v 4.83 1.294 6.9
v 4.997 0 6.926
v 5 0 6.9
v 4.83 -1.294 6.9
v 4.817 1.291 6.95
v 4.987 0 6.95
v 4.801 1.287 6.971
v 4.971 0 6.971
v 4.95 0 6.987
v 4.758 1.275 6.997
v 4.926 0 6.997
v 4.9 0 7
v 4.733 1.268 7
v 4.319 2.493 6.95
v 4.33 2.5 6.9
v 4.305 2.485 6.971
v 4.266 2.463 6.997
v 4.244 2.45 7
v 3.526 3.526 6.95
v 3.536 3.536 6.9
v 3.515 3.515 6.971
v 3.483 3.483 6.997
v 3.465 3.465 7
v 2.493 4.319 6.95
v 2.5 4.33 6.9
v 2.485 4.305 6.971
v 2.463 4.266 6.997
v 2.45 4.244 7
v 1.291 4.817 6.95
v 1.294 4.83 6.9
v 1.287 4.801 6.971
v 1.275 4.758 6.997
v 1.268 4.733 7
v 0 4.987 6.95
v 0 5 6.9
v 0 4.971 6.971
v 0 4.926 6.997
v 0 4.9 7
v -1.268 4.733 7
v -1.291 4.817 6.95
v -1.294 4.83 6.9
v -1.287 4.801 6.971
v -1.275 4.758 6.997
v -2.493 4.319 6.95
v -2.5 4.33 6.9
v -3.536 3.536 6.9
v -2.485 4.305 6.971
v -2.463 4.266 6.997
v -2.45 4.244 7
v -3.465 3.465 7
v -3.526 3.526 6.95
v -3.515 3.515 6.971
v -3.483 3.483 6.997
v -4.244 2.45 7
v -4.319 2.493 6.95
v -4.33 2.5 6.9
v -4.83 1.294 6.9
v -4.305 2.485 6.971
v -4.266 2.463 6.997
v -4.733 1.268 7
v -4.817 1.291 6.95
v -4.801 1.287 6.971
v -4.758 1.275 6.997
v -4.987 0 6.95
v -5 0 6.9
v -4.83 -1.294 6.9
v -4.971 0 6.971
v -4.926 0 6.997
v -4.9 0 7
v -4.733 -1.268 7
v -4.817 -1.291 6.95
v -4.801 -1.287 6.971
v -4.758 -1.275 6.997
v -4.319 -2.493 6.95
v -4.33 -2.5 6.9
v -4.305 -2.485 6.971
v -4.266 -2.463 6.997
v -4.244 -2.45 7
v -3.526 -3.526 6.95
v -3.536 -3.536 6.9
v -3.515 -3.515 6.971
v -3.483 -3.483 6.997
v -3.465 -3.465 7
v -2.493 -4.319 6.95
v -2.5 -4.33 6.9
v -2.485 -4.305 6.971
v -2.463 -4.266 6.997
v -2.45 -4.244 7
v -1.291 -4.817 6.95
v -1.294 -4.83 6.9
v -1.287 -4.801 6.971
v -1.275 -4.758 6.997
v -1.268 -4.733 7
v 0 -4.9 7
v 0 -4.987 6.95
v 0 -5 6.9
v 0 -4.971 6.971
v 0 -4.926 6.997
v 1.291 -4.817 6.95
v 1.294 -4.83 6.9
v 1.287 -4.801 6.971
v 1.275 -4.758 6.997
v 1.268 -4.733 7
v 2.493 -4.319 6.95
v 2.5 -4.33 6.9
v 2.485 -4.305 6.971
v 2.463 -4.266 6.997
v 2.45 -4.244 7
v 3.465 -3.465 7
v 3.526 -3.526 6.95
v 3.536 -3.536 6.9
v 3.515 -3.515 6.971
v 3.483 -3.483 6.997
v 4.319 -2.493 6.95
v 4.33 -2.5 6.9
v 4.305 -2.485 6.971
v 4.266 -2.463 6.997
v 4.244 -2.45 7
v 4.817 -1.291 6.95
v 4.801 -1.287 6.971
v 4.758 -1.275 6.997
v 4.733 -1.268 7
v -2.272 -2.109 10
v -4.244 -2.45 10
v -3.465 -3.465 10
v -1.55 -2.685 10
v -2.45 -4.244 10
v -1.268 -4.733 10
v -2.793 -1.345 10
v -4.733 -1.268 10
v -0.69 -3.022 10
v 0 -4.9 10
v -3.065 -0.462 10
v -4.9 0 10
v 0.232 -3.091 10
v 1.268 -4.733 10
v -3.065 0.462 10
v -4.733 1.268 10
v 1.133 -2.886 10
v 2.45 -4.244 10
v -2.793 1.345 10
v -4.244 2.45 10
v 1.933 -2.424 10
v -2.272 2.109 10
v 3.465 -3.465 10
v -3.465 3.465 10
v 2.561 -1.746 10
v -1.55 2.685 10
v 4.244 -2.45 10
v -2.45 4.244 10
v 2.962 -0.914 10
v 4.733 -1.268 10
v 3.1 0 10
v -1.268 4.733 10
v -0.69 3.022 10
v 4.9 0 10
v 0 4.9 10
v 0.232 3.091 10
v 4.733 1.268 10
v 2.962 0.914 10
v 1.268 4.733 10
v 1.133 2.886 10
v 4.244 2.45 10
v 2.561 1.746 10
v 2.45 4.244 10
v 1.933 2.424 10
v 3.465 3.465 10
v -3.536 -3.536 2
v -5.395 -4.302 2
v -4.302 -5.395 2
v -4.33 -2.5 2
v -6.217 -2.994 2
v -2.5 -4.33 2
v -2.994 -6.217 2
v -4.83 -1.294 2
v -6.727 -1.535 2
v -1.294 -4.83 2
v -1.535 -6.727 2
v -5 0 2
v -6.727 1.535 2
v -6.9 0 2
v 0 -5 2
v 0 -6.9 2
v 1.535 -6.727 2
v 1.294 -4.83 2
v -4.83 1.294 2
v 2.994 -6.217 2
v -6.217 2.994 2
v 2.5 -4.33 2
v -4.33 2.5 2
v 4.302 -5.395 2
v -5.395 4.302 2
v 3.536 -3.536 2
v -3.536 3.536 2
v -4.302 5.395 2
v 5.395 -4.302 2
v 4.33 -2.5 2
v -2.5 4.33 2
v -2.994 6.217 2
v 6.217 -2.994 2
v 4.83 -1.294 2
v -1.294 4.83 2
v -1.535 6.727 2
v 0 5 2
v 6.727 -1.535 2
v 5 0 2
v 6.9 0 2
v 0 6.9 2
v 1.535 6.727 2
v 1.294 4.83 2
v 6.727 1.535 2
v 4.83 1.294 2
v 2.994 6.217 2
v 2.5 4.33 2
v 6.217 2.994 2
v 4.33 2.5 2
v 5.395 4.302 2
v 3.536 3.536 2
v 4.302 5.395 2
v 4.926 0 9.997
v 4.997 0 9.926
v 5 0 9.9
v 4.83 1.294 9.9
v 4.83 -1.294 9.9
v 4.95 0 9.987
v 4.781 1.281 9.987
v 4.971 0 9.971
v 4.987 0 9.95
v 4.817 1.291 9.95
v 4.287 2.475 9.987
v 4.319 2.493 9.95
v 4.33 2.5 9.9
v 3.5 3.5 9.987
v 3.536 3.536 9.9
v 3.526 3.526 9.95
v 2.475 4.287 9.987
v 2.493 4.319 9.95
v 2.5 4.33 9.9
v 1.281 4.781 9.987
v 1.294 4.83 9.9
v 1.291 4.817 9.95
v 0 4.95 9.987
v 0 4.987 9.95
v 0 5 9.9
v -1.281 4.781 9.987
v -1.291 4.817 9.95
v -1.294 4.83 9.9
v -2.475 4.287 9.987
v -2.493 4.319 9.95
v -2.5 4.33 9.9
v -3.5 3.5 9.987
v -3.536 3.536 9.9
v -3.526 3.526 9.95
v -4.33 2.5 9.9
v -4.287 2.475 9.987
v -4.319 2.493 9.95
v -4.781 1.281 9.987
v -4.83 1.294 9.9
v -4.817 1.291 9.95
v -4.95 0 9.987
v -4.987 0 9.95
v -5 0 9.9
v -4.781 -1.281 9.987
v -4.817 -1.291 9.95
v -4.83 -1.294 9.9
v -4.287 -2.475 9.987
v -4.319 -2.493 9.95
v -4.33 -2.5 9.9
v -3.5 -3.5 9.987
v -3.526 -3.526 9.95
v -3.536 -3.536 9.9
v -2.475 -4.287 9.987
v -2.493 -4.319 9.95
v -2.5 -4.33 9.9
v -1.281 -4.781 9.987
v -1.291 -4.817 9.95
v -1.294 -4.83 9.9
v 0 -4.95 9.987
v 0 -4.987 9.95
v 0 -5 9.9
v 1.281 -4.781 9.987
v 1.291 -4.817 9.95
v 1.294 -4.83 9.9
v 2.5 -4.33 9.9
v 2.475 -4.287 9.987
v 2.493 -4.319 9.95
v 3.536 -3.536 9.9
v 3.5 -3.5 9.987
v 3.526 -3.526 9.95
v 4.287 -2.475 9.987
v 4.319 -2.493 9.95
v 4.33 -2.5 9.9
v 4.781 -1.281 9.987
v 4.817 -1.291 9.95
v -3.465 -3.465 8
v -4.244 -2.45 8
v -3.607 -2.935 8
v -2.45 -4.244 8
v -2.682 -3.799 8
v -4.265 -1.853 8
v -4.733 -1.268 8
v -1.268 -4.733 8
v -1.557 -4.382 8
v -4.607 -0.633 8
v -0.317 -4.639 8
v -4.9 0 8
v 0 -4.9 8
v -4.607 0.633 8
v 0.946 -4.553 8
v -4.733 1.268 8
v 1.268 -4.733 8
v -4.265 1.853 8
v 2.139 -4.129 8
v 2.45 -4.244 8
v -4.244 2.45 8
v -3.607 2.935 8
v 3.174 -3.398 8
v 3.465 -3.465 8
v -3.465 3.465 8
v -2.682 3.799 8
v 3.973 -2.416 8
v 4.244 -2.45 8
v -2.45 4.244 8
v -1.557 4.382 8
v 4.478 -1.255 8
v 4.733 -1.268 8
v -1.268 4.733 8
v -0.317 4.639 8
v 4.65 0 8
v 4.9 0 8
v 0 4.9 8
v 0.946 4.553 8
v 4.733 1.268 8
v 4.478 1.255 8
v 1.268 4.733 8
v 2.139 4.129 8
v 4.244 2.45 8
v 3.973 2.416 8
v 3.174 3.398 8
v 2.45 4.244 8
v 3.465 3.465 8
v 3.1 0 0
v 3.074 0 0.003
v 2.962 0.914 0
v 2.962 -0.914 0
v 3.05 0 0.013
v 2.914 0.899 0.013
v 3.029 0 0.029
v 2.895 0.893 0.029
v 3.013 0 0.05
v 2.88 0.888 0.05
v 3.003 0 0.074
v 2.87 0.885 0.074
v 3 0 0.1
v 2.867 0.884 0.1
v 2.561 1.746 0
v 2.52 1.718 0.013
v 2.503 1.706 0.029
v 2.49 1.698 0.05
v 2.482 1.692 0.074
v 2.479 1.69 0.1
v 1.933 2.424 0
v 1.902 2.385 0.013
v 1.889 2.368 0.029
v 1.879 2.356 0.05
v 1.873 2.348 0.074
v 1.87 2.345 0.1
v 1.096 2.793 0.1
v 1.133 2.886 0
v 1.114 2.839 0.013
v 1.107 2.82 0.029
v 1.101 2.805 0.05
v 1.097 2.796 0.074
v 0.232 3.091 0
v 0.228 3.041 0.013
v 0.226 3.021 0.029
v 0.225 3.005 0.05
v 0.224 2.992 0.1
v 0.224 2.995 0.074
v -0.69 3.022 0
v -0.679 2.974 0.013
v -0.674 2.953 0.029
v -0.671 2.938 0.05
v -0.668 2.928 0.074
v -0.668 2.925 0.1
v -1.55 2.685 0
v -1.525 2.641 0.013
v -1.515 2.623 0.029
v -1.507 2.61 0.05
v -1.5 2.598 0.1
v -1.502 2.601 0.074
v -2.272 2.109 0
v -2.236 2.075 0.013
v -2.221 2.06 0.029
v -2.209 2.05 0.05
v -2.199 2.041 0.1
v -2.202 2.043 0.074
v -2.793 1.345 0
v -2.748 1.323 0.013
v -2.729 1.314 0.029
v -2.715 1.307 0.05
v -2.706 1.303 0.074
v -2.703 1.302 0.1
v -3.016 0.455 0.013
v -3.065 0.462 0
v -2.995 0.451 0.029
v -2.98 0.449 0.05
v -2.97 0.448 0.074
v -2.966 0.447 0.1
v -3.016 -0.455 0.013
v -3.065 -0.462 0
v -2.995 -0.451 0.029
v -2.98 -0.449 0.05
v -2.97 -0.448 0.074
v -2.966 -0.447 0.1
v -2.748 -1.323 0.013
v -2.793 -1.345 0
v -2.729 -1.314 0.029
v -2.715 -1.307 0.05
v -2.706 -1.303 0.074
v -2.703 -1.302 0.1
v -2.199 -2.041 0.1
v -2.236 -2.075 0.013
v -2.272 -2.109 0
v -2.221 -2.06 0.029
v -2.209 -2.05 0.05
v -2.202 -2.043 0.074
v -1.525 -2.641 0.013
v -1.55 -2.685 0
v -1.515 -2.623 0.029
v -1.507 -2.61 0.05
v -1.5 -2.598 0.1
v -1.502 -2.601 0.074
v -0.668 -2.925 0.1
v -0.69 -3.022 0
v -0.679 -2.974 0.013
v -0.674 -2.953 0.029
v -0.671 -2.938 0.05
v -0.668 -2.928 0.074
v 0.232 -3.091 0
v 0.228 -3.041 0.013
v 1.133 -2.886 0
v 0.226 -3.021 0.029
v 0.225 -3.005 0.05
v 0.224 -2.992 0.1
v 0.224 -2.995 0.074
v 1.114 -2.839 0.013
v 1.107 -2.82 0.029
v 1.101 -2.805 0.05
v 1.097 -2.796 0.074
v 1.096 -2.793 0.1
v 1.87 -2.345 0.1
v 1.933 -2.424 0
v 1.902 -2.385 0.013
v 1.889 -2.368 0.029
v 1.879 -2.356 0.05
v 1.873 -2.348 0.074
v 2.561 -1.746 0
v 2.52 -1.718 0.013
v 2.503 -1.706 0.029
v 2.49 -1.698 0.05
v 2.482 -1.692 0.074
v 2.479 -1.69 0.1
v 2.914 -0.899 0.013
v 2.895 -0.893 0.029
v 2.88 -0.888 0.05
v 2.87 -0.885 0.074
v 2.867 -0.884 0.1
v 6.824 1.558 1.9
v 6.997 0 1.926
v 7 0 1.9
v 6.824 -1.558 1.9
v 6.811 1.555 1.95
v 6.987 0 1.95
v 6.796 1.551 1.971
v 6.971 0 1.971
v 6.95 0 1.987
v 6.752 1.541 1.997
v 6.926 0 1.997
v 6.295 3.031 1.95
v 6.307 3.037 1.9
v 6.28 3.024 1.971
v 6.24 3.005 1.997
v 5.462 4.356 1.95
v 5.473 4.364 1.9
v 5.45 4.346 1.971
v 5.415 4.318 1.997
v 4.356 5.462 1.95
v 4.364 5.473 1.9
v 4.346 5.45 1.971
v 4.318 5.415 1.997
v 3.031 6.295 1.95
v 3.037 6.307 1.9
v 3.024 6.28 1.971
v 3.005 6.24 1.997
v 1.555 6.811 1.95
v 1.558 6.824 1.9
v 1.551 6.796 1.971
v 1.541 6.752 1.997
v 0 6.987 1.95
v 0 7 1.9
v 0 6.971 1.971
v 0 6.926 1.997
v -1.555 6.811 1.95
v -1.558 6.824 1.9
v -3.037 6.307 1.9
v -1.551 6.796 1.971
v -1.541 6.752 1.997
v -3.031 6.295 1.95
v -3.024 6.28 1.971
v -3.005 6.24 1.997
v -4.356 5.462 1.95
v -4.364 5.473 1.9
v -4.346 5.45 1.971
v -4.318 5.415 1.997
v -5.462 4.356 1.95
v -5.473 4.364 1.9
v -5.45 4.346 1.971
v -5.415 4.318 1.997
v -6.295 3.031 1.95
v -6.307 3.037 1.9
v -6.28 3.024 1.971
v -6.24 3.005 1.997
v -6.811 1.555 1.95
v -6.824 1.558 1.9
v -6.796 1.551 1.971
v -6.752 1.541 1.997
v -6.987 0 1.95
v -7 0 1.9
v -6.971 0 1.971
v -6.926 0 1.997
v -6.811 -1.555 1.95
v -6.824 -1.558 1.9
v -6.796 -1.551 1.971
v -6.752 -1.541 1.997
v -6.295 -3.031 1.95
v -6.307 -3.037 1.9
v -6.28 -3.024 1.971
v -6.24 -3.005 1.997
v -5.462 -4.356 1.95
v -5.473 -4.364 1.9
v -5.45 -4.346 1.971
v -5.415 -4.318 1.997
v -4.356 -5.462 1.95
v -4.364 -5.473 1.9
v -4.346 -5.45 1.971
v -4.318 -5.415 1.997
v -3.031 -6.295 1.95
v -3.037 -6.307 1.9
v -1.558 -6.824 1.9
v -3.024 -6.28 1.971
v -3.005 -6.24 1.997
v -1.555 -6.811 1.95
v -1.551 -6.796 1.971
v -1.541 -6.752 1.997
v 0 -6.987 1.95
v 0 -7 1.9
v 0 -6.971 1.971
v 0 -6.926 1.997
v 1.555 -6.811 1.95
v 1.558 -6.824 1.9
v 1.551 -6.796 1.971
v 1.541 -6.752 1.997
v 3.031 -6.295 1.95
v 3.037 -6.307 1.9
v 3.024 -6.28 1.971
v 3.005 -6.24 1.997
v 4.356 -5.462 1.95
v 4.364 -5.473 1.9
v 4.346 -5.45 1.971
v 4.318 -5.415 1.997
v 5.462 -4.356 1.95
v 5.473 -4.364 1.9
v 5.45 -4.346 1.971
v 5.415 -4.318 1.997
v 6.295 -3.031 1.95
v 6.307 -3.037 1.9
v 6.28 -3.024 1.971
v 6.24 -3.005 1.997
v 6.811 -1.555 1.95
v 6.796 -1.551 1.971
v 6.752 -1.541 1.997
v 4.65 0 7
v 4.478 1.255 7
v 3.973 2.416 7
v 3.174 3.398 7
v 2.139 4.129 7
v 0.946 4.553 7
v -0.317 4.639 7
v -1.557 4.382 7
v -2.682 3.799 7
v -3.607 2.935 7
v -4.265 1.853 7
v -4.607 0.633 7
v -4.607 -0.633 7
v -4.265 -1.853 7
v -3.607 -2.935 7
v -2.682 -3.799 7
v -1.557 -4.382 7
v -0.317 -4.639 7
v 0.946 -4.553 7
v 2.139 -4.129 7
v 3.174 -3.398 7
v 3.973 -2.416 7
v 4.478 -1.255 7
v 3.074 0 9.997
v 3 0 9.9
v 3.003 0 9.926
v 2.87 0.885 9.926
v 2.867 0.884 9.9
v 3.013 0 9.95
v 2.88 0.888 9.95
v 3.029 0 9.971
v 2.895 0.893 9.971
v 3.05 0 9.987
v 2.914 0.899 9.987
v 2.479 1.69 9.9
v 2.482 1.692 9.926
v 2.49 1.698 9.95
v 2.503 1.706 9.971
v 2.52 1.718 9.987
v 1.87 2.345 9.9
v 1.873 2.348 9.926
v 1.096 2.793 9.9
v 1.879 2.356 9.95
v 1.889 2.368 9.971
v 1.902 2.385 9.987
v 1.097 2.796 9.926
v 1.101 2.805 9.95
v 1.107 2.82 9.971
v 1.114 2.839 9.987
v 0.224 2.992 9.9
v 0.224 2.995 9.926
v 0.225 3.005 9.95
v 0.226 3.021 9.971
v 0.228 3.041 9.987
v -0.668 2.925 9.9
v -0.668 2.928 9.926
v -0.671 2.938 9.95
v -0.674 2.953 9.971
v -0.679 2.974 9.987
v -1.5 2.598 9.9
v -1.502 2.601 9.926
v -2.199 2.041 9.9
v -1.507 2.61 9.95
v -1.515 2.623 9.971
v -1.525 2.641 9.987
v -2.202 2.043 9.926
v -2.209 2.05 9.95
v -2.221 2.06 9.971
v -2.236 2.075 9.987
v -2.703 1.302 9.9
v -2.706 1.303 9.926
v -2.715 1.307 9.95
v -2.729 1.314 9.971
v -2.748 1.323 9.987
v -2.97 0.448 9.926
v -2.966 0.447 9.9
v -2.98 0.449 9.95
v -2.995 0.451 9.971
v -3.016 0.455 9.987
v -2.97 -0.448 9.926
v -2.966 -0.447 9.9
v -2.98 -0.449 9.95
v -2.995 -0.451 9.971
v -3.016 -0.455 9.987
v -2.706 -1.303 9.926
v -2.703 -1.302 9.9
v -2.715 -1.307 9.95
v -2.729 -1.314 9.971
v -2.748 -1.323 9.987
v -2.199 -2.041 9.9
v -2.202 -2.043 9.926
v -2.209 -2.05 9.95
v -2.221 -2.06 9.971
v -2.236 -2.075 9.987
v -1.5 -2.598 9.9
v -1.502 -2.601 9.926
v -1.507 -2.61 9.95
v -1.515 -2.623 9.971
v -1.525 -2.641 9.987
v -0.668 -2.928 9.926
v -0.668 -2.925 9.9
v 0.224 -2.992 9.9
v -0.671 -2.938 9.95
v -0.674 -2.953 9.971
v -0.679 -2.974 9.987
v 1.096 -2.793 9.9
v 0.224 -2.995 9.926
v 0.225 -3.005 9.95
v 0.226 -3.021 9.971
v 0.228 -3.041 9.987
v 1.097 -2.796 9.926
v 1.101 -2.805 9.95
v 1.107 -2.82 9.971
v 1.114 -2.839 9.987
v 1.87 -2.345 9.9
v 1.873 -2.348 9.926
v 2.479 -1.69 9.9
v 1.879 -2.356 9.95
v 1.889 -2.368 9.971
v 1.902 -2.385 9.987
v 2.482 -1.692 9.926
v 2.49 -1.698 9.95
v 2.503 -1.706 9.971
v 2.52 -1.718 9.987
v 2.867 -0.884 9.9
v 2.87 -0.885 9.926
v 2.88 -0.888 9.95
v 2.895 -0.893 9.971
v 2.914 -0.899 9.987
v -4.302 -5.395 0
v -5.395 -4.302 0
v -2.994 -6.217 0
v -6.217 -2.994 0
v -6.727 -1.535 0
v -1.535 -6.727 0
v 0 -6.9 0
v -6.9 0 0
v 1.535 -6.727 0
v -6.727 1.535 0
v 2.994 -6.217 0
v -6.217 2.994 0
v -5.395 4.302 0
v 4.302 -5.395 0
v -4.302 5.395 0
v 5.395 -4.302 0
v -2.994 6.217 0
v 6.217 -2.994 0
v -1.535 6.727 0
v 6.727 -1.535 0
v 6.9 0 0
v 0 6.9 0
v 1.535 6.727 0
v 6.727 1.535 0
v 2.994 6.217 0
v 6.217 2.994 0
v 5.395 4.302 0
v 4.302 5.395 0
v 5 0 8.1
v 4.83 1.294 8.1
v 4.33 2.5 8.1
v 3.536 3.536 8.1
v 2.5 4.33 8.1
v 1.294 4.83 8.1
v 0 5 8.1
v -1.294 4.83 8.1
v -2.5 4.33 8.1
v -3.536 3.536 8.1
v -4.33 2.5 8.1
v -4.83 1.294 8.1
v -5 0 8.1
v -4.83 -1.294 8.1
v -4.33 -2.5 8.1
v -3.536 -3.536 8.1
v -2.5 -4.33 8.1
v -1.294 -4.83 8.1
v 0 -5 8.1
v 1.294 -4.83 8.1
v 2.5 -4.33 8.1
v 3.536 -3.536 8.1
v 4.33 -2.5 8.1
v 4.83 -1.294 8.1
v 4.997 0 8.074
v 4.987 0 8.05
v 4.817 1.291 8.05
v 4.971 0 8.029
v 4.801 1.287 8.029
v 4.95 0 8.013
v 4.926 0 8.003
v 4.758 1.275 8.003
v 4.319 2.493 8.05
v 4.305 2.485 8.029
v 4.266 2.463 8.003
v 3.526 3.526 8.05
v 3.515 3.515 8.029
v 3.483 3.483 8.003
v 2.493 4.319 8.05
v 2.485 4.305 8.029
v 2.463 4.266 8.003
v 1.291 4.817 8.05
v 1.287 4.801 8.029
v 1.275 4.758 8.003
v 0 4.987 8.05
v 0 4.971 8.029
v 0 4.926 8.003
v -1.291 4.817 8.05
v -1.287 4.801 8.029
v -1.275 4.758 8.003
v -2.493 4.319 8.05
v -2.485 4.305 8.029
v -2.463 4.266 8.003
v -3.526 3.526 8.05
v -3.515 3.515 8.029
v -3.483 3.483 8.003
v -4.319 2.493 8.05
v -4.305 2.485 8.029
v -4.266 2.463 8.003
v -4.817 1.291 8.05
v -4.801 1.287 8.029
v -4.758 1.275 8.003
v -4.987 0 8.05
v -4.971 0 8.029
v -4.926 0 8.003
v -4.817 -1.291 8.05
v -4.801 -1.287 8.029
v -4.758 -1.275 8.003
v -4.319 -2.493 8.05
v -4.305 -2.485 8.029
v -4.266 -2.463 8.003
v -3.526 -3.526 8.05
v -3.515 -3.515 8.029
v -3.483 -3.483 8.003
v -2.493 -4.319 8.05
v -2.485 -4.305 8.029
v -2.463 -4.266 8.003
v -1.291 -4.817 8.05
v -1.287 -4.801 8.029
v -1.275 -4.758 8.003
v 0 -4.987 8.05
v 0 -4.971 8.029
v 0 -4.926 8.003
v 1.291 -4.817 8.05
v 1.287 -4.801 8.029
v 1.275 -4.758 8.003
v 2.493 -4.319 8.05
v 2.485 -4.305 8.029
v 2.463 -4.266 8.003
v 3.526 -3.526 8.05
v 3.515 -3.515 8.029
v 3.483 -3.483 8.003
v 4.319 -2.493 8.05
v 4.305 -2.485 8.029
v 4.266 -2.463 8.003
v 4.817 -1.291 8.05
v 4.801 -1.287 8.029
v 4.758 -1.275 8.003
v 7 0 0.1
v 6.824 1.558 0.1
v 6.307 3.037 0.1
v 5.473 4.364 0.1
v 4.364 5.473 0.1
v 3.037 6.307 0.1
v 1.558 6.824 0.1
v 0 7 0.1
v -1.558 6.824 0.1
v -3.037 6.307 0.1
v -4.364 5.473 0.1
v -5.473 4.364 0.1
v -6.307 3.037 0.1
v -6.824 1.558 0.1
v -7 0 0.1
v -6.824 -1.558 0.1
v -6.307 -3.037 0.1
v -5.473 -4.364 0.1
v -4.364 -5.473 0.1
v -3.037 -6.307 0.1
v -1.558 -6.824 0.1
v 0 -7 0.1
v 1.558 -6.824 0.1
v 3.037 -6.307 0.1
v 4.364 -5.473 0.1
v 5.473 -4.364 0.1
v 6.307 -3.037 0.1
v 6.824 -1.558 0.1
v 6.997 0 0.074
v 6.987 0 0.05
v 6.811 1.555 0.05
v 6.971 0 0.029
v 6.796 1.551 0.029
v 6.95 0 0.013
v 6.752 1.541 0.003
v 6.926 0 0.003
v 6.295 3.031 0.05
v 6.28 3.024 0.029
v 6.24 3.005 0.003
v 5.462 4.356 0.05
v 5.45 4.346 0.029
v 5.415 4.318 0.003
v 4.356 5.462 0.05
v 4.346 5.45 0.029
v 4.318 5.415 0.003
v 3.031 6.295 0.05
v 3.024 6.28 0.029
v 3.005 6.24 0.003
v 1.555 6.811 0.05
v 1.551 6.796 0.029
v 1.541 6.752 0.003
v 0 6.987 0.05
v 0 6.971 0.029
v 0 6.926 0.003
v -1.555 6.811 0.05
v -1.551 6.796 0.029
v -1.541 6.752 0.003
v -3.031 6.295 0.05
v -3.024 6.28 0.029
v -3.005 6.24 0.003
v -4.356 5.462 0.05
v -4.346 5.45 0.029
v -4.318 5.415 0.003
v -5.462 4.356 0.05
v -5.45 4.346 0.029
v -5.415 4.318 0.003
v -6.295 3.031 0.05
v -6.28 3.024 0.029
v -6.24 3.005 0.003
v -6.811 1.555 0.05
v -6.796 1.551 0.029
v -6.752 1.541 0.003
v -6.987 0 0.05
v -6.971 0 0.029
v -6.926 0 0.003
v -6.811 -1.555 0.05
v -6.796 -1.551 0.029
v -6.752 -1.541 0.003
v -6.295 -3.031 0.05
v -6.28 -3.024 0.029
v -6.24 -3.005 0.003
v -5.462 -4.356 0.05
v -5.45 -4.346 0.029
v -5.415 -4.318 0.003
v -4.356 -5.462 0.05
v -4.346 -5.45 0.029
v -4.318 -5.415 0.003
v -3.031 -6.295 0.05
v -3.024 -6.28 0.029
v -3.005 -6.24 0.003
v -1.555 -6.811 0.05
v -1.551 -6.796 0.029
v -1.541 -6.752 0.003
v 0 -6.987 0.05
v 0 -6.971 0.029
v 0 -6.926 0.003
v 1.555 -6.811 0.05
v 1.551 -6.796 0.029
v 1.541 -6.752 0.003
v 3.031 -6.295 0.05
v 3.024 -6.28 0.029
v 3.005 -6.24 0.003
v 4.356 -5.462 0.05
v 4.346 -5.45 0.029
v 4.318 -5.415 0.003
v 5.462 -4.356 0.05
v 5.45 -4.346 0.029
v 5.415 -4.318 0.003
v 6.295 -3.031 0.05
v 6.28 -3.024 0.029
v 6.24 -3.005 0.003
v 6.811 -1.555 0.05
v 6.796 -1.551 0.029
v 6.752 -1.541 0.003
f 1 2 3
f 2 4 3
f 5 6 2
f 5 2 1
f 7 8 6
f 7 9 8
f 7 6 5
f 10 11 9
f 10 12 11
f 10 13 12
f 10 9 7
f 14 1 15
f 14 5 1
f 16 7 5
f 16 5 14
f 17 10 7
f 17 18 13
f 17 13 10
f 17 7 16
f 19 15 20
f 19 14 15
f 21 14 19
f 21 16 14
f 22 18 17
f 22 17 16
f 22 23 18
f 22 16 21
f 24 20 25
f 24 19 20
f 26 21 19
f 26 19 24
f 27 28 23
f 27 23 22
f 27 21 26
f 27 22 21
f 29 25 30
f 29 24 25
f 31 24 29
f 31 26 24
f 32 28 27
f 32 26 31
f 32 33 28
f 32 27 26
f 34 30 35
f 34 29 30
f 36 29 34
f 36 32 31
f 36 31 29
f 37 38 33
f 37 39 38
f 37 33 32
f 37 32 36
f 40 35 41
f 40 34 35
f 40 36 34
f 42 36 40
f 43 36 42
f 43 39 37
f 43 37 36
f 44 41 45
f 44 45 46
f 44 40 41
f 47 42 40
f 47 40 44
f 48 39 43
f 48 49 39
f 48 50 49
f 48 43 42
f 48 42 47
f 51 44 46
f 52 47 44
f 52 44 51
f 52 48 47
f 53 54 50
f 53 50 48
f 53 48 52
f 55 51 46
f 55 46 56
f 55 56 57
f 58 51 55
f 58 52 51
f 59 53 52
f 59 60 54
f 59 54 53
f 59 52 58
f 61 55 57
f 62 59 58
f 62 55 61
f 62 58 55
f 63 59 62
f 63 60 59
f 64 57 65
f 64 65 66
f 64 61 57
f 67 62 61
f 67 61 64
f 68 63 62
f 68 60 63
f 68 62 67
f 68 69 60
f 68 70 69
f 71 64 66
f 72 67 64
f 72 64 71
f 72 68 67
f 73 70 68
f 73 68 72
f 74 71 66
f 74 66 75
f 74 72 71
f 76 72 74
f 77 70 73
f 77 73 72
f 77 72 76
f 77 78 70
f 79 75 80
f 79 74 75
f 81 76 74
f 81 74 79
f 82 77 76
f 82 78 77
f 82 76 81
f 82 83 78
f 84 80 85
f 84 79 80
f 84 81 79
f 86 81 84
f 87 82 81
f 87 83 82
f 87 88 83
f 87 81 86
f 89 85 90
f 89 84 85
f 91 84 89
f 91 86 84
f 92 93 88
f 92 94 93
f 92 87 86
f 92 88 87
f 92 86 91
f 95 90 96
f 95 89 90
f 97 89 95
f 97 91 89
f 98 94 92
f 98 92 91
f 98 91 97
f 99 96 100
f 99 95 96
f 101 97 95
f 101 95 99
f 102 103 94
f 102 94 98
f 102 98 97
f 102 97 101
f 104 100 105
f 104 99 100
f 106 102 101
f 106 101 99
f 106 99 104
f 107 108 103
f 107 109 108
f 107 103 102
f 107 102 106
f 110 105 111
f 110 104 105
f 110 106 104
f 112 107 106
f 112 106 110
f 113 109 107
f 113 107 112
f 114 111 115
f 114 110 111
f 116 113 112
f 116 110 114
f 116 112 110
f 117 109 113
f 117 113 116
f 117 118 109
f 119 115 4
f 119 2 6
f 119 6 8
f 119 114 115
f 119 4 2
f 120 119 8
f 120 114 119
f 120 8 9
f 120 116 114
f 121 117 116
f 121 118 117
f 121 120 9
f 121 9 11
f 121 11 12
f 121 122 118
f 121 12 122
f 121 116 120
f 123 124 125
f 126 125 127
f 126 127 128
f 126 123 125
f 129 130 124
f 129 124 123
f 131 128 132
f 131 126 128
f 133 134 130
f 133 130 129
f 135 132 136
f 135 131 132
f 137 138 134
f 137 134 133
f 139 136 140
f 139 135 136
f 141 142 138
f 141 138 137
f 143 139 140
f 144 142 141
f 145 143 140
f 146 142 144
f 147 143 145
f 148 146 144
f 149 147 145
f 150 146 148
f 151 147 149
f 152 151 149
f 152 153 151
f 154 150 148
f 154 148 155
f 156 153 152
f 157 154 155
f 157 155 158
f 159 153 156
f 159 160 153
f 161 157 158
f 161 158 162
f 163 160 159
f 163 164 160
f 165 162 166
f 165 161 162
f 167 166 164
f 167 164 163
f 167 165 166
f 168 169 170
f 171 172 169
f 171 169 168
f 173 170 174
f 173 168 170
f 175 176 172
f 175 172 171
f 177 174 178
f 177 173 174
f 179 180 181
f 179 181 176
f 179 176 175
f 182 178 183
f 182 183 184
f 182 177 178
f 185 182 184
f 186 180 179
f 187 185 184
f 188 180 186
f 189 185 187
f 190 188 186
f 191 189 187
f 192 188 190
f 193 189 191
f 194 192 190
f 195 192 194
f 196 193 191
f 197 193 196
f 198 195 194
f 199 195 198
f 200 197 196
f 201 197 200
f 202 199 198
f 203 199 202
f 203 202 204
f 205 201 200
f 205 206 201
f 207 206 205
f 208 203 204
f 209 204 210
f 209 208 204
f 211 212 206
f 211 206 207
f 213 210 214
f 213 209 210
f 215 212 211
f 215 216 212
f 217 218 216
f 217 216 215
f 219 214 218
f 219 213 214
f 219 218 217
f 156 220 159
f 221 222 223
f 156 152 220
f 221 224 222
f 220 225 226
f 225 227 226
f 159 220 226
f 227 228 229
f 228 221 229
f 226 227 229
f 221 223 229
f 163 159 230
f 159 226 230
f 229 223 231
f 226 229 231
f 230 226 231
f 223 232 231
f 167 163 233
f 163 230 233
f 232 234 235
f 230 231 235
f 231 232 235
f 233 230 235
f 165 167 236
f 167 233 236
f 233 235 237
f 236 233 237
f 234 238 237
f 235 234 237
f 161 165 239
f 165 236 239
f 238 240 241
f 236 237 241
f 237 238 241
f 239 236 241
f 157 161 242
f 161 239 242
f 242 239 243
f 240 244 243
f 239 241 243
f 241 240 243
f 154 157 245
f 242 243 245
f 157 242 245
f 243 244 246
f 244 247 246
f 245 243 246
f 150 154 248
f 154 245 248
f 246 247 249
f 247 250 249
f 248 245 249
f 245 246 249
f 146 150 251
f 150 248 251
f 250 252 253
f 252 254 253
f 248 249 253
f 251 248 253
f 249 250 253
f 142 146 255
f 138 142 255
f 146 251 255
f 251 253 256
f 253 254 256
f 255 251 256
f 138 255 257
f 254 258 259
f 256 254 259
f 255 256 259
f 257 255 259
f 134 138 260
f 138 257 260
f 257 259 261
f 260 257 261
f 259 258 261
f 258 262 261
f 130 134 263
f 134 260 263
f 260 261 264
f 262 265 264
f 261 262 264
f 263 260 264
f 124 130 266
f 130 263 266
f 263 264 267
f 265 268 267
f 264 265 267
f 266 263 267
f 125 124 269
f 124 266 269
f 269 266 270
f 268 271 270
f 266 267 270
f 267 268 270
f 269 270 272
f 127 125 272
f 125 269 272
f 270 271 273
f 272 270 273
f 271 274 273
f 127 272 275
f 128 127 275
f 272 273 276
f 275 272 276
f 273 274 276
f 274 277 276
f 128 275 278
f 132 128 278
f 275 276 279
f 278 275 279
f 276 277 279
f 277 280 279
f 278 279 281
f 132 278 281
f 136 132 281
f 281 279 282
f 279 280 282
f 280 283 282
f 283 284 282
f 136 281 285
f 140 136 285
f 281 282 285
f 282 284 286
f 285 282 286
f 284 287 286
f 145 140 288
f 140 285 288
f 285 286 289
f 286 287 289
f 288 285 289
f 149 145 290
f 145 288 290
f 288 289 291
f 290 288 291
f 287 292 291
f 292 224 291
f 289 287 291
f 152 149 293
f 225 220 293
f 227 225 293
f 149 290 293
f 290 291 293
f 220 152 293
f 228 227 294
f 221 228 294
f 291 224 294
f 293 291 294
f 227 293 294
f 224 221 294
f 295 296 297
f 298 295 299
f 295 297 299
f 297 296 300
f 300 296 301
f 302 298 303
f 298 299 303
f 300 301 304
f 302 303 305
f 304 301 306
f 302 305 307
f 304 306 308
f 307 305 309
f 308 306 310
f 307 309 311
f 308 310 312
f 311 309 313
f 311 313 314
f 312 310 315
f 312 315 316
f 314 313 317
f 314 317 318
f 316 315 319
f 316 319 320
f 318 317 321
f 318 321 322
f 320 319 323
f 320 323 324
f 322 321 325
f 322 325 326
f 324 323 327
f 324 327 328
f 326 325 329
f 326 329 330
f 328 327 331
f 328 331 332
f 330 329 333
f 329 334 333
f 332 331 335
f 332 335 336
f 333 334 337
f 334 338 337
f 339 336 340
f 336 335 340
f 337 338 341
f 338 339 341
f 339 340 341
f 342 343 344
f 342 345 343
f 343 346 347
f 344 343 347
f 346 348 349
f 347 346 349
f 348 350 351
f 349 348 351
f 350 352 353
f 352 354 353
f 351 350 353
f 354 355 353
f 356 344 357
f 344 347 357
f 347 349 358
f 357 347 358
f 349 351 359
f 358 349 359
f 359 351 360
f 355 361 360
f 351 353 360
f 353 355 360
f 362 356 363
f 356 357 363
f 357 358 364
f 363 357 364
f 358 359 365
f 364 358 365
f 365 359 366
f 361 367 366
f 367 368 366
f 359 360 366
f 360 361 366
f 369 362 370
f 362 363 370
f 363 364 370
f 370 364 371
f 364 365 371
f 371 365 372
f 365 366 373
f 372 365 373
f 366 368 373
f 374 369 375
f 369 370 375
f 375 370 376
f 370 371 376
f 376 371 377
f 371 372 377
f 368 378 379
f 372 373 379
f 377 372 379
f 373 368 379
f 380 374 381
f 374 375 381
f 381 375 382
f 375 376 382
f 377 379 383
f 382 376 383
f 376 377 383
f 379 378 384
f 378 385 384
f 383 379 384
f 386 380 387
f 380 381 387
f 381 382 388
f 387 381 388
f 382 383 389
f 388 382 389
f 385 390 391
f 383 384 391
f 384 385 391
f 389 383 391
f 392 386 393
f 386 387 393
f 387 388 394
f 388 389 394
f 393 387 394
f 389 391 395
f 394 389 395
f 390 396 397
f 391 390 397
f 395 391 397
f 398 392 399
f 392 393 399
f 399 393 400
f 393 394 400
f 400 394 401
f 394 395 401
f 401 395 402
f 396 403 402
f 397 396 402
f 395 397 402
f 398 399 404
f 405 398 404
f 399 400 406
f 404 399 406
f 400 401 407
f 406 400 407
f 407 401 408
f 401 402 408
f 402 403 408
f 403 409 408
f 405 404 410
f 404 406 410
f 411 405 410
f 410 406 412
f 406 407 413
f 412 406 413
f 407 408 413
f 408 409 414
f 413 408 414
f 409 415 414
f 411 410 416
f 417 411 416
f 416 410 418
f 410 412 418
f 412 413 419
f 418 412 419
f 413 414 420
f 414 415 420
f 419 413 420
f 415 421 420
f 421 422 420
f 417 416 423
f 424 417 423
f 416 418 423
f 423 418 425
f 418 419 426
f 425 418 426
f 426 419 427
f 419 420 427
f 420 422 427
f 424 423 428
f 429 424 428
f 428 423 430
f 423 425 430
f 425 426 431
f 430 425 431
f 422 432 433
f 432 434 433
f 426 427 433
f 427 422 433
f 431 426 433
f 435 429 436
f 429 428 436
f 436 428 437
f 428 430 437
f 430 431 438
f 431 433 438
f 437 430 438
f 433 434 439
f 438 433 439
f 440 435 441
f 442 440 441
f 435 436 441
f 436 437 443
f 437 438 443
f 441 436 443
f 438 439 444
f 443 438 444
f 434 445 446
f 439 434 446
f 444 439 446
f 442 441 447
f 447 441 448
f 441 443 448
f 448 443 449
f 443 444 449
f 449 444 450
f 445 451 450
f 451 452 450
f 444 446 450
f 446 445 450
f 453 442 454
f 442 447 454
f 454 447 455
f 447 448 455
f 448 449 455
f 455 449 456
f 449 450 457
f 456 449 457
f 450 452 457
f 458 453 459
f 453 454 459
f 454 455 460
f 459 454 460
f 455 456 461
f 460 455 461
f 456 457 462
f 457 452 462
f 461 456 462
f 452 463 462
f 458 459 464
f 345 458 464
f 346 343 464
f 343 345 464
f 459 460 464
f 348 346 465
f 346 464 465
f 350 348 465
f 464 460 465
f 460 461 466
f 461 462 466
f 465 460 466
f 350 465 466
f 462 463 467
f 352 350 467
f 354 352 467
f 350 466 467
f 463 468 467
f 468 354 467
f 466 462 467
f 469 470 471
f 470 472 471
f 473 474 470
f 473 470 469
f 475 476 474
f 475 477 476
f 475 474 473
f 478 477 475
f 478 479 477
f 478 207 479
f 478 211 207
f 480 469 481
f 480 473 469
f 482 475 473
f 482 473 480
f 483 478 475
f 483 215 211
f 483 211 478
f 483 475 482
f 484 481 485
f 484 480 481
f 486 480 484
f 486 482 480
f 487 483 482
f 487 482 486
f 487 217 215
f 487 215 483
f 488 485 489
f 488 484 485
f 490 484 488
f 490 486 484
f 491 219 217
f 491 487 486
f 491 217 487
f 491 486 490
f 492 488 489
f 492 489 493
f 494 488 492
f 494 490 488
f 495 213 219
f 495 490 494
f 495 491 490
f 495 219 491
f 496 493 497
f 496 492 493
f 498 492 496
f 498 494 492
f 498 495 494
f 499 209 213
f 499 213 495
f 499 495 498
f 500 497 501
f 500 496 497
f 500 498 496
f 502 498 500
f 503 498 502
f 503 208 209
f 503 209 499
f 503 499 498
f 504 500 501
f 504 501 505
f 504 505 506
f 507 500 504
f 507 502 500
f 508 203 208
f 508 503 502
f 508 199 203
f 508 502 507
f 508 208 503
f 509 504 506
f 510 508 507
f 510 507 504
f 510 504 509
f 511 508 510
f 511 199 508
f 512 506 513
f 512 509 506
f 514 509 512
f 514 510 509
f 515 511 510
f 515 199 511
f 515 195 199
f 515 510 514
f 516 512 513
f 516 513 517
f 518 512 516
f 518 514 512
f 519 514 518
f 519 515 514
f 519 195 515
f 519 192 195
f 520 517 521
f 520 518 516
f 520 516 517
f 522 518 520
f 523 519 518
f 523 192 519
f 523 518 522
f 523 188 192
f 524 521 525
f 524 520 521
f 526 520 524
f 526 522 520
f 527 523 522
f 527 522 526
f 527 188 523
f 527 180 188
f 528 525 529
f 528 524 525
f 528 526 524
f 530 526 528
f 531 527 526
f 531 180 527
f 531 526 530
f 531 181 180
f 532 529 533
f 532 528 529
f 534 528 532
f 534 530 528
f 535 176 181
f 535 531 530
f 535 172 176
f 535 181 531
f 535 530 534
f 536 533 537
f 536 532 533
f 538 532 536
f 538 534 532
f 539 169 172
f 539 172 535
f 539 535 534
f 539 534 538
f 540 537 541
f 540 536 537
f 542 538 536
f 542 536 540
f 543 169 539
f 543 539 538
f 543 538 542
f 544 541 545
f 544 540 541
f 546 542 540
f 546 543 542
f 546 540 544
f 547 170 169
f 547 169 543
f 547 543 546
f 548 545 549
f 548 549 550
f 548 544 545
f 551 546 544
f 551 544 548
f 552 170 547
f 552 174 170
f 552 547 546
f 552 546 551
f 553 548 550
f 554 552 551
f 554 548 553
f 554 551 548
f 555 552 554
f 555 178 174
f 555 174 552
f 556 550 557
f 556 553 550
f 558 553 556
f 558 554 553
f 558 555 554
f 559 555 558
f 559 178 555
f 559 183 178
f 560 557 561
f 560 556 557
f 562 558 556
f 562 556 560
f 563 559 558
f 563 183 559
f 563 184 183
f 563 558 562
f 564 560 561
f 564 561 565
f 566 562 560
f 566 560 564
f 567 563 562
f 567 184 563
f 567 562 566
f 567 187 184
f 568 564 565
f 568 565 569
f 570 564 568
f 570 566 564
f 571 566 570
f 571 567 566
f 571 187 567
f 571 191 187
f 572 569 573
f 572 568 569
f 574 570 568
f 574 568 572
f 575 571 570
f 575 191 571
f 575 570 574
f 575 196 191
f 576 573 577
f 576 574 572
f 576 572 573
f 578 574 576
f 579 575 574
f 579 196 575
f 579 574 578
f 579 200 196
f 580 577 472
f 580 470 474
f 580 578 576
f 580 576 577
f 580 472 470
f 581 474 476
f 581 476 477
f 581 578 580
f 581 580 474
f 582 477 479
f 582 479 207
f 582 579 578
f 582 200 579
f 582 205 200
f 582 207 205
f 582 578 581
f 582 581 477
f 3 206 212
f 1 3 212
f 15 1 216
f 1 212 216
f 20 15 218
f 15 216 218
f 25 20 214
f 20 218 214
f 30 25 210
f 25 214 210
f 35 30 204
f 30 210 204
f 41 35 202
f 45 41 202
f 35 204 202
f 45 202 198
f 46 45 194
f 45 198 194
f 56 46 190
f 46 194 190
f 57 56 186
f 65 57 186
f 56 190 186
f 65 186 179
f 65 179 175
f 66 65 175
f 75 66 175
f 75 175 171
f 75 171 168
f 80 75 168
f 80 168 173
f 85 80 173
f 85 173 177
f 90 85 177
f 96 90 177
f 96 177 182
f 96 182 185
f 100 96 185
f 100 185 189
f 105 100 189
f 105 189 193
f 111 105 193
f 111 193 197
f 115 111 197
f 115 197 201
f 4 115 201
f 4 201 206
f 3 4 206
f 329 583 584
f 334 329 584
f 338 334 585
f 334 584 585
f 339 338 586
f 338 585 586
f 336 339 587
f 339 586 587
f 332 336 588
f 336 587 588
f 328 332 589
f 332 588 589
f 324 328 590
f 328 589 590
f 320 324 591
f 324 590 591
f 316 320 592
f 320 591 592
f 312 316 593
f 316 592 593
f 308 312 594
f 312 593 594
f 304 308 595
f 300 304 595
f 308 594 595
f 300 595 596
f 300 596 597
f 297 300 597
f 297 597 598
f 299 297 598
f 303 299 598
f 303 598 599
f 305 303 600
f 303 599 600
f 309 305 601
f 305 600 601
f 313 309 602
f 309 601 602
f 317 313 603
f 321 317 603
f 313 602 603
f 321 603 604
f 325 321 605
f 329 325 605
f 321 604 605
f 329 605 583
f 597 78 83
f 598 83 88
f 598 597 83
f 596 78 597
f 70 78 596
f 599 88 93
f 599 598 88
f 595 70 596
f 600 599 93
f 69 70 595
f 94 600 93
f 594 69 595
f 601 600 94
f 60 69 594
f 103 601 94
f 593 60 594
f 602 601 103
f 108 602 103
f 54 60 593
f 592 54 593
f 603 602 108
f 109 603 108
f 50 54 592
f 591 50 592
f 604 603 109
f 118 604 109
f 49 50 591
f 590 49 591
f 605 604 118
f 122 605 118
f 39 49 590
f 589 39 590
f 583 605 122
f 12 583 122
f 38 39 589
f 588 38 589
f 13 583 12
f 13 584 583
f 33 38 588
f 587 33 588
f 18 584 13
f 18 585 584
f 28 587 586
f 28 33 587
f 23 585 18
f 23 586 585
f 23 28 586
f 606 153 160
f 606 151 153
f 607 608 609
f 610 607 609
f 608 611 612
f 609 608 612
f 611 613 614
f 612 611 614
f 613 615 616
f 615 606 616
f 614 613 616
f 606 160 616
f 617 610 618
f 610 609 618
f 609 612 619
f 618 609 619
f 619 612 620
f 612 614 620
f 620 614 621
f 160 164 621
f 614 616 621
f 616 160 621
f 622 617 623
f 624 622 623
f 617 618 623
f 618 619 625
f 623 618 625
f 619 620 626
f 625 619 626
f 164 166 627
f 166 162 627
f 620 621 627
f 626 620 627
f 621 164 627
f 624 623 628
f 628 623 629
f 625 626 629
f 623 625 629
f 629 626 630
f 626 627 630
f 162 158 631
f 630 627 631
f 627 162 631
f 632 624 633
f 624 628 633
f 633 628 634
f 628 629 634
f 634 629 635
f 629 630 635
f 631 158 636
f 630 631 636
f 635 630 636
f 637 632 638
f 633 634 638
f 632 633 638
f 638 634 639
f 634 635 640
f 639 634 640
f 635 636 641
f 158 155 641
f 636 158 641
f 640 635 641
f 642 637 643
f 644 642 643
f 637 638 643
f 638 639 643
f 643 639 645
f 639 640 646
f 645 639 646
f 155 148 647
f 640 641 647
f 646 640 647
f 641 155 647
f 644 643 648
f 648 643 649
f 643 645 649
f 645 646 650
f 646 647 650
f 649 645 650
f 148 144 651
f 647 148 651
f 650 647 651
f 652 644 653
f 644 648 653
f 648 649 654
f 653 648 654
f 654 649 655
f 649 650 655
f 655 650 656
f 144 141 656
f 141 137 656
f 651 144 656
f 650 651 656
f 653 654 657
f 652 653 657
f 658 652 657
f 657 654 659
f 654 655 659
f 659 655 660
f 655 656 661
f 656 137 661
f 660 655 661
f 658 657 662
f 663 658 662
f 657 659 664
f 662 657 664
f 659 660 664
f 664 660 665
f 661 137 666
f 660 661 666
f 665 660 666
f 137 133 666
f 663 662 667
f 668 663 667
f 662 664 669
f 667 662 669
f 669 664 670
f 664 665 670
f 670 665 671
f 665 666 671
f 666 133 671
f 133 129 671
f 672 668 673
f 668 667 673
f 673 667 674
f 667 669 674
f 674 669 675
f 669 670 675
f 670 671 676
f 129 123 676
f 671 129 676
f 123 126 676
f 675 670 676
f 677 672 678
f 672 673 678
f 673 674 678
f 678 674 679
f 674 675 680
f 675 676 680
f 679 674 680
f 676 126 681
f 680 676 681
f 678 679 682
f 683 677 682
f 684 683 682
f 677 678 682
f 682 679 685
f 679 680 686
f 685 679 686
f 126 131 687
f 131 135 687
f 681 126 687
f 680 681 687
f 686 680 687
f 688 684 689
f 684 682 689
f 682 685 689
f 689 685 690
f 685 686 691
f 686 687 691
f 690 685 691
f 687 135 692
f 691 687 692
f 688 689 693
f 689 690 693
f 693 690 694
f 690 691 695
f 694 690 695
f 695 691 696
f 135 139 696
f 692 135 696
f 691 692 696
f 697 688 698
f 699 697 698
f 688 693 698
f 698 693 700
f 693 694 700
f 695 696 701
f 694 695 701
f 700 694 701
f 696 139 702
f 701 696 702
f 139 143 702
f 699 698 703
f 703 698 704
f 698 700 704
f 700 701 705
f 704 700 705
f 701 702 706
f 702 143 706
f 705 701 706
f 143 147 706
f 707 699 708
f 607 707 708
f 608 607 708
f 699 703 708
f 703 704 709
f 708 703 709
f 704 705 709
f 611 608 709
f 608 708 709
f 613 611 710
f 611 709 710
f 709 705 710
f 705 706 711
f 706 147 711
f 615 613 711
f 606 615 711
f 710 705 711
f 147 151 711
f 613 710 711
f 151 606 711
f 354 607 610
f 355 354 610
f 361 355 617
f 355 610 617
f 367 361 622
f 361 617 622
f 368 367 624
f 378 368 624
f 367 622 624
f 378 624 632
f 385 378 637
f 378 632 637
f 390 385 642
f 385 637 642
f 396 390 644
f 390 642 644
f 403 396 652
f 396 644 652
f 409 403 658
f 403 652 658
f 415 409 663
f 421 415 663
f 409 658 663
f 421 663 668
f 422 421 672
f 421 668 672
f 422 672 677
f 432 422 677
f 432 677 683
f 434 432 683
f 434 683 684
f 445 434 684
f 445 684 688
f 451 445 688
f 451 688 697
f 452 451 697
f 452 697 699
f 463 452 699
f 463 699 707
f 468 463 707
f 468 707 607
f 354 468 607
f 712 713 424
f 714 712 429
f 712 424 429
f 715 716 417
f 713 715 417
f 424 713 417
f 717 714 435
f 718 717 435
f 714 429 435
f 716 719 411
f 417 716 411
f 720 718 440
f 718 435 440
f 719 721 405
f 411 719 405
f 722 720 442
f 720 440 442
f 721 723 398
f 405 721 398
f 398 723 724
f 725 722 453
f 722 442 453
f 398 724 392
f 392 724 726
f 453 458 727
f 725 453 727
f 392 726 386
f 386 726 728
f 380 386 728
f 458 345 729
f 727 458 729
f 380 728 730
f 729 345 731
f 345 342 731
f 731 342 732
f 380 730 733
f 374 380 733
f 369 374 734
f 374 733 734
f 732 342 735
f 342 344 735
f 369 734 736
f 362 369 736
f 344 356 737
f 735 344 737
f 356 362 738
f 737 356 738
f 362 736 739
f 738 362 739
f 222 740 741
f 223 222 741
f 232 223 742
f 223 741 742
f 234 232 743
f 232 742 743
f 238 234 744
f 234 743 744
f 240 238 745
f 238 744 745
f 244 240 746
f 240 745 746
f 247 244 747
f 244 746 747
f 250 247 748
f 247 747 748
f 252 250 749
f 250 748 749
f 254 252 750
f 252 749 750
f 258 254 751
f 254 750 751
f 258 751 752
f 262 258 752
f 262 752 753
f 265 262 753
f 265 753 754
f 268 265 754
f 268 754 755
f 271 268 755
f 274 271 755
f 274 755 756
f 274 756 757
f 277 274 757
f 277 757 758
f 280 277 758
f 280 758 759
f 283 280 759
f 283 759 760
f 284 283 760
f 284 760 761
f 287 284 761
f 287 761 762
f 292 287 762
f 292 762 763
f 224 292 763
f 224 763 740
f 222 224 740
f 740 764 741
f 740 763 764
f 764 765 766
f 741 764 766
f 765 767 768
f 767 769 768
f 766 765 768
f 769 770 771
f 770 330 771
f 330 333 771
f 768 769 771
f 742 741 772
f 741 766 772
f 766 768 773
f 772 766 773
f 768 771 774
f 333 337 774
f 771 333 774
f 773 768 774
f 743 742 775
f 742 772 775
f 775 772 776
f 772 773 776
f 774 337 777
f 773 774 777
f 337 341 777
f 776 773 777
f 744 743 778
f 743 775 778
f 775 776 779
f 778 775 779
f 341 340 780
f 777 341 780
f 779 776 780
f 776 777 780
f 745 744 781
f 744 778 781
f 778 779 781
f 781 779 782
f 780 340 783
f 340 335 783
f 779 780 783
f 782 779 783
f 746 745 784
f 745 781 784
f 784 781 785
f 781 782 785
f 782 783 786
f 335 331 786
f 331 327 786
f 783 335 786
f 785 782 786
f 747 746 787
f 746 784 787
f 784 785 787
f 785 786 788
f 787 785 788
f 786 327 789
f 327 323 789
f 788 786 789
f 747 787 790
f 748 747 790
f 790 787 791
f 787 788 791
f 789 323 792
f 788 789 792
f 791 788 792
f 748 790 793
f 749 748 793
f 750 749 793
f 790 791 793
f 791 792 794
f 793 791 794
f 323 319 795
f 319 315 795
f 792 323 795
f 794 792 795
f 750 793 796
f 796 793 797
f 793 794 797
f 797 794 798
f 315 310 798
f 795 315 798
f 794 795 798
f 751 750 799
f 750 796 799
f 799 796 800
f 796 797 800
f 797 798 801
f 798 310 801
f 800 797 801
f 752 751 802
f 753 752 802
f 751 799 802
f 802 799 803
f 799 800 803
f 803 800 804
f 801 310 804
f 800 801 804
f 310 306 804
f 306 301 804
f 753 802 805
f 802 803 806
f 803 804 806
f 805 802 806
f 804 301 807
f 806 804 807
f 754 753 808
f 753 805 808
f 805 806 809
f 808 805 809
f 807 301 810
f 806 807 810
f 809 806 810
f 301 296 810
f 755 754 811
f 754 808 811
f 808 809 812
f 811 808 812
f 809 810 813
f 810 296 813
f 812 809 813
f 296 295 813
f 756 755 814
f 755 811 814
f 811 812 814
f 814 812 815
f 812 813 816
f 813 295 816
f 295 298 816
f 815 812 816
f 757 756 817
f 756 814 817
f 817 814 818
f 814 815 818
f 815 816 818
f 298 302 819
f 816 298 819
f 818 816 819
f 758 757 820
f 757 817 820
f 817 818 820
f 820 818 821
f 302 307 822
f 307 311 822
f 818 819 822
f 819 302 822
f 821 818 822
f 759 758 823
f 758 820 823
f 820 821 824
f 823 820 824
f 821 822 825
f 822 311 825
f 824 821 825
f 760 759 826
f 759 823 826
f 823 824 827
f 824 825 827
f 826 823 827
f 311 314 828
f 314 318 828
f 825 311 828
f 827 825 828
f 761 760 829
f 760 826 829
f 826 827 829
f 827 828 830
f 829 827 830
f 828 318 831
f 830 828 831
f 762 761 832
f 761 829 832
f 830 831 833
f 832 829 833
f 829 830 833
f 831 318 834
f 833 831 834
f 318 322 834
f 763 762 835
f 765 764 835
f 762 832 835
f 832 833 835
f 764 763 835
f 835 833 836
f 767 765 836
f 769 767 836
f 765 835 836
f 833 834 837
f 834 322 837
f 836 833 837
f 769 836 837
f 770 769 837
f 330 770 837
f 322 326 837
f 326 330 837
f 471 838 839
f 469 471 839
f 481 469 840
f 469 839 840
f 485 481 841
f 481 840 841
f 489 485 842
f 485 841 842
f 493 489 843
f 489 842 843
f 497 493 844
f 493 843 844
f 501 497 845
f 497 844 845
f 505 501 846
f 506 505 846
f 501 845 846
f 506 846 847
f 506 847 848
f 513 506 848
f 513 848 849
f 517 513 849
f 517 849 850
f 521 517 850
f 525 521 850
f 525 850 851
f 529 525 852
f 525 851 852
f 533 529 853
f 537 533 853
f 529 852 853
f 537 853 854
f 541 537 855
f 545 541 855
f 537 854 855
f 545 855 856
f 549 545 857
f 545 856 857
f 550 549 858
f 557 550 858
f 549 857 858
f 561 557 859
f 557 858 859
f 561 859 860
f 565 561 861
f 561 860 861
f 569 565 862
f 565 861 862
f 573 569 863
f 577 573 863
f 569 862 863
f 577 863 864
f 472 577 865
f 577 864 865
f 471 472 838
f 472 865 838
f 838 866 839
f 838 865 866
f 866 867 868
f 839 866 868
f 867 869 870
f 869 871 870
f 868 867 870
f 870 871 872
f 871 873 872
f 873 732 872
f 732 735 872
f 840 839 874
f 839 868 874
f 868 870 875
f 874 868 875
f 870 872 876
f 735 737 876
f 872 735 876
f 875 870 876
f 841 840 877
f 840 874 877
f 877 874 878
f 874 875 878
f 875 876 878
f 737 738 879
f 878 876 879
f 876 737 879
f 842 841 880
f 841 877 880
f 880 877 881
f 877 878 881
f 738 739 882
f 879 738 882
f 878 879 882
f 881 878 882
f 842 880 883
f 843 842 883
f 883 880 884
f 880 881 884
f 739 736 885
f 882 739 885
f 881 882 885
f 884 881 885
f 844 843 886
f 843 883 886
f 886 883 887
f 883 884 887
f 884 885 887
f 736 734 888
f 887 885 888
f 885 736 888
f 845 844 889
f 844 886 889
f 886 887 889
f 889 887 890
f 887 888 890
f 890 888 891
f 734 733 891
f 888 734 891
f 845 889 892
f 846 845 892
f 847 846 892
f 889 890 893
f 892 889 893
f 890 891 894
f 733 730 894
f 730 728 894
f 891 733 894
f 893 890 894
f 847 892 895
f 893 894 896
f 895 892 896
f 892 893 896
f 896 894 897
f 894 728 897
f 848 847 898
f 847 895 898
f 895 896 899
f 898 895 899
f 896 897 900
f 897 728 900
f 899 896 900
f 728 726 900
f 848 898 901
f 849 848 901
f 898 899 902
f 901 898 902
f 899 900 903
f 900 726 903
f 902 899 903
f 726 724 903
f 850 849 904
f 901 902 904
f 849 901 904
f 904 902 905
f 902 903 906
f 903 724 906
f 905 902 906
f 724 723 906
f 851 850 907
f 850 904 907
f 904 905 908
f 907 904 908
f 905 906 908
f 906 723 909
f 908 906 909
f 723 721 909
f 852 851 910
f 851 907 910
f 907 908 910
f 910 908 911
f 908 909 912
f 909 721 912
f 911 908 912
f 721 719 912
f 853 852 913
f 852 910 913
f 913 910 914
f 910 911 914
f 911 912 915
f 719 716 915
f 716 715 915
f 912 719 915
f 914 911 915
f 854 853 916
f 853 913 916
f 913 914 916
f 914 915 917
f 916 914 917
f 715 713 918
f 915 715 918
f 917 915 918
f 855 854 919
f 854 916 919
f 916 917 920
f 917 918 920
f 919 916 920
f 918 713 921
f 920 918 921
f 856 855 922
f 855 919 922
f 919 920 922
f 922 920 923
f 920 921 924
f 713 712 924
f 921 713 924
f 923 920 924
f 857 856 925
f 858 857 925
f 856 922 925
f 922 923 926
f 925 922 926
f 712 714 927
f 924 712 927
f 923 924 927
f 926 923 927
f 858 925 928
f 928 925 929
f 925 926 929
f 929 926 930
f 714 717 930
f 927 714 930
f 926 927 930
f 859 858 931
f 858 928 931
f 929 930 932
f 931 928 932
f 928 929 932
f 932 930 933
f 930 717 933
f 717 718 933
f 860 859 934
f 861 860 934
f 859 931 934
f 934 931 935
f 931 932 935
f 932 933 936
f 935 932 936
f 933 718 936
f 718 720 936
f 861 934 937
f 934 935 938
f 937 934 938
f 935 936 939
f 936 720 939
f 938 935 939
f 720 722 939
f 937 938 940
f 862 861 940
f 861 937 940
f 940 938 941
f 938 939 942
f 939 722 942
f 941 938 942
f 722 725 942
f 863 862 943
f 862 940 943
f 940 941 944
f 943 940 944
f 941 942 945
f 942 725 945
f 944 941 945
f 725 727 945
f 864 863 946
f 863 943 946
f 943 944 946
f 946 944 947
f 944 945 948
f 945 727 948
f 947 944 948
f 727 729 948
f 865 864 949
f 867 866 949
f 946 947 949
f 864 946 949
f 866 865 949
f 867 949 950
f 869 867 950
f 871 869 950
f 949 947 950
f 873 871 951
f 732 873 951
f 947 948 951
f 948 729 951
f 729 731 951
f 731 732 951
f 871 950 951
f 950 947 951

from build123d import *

# Parameters (mm, degrees)
SKETCH1_R          = 7
EXTRUDE1_DEPTH     = 2
SKETCH2_R          = 5
EXTRUDE2_DEPTH     = 8
SKETCH3_R          = 3
CUT_EXTRUDE1_DEPTH = 15.071247279
CUT_EXTRUDE3_START = -3
SKETCH4_R          = 5
SKETCH4_R_2        = 4.65
CUT_EXTRUDE3_DEPTH = 1
FILLET1_R          = 0.1


with BuildPart() as part:
    # Sketch1 → Extrude1 (new body)
    with BuildSketch(Plane.XY):
        Circle(SKETCH1_R)
    extrude(amount=EXTRUDE1_DEPTH)

    # Sketch2 → Extrude2 (add)
    with BuildSketch(Plane.XY.offset(2)):
        Circle(SKETCH2_R)
    extrude(amount=EXTRUDE2_DEPTH)

    # Sketch3 → Cut-Extrude1 (cut, through all)
    with BuildSketch(Plane.XY.offset(10)):
        Circle(SKETCH3_R)
    extrude(amount=-CUT_EXTRUDE1_DEPTH, mode=Mode.SUBTRACT)

    # Sketch4 → Cut-Extrude3 (cut)
    with BuildSketch(Plane.XY.offset(10).offset(CUT_EXTRUDE3_START)):
        Circle(SKETCH4_R)
        Circle(SKETCH4_R_2, mode=Mode.SUBTRACT)
    extrude(amount=CUT_EXTRUDE3_DEPTH, mode=Mode.SUBTRACT)

    # Fillet1
    fillet1_edges = [part.edges().sort_by_distance(p)[0] for p in [
        (-3, 0, 0),
        (-3, 0, 10),
        (-5, 0, 7),
        (-5, 0, 8),
        (-7, 0, 0),
        (-7, 0, 2),
        (-5, 0, 10),
    ]]
    fillet(fillet1_edges, radius=FILLET1_R)


solid = part.part
